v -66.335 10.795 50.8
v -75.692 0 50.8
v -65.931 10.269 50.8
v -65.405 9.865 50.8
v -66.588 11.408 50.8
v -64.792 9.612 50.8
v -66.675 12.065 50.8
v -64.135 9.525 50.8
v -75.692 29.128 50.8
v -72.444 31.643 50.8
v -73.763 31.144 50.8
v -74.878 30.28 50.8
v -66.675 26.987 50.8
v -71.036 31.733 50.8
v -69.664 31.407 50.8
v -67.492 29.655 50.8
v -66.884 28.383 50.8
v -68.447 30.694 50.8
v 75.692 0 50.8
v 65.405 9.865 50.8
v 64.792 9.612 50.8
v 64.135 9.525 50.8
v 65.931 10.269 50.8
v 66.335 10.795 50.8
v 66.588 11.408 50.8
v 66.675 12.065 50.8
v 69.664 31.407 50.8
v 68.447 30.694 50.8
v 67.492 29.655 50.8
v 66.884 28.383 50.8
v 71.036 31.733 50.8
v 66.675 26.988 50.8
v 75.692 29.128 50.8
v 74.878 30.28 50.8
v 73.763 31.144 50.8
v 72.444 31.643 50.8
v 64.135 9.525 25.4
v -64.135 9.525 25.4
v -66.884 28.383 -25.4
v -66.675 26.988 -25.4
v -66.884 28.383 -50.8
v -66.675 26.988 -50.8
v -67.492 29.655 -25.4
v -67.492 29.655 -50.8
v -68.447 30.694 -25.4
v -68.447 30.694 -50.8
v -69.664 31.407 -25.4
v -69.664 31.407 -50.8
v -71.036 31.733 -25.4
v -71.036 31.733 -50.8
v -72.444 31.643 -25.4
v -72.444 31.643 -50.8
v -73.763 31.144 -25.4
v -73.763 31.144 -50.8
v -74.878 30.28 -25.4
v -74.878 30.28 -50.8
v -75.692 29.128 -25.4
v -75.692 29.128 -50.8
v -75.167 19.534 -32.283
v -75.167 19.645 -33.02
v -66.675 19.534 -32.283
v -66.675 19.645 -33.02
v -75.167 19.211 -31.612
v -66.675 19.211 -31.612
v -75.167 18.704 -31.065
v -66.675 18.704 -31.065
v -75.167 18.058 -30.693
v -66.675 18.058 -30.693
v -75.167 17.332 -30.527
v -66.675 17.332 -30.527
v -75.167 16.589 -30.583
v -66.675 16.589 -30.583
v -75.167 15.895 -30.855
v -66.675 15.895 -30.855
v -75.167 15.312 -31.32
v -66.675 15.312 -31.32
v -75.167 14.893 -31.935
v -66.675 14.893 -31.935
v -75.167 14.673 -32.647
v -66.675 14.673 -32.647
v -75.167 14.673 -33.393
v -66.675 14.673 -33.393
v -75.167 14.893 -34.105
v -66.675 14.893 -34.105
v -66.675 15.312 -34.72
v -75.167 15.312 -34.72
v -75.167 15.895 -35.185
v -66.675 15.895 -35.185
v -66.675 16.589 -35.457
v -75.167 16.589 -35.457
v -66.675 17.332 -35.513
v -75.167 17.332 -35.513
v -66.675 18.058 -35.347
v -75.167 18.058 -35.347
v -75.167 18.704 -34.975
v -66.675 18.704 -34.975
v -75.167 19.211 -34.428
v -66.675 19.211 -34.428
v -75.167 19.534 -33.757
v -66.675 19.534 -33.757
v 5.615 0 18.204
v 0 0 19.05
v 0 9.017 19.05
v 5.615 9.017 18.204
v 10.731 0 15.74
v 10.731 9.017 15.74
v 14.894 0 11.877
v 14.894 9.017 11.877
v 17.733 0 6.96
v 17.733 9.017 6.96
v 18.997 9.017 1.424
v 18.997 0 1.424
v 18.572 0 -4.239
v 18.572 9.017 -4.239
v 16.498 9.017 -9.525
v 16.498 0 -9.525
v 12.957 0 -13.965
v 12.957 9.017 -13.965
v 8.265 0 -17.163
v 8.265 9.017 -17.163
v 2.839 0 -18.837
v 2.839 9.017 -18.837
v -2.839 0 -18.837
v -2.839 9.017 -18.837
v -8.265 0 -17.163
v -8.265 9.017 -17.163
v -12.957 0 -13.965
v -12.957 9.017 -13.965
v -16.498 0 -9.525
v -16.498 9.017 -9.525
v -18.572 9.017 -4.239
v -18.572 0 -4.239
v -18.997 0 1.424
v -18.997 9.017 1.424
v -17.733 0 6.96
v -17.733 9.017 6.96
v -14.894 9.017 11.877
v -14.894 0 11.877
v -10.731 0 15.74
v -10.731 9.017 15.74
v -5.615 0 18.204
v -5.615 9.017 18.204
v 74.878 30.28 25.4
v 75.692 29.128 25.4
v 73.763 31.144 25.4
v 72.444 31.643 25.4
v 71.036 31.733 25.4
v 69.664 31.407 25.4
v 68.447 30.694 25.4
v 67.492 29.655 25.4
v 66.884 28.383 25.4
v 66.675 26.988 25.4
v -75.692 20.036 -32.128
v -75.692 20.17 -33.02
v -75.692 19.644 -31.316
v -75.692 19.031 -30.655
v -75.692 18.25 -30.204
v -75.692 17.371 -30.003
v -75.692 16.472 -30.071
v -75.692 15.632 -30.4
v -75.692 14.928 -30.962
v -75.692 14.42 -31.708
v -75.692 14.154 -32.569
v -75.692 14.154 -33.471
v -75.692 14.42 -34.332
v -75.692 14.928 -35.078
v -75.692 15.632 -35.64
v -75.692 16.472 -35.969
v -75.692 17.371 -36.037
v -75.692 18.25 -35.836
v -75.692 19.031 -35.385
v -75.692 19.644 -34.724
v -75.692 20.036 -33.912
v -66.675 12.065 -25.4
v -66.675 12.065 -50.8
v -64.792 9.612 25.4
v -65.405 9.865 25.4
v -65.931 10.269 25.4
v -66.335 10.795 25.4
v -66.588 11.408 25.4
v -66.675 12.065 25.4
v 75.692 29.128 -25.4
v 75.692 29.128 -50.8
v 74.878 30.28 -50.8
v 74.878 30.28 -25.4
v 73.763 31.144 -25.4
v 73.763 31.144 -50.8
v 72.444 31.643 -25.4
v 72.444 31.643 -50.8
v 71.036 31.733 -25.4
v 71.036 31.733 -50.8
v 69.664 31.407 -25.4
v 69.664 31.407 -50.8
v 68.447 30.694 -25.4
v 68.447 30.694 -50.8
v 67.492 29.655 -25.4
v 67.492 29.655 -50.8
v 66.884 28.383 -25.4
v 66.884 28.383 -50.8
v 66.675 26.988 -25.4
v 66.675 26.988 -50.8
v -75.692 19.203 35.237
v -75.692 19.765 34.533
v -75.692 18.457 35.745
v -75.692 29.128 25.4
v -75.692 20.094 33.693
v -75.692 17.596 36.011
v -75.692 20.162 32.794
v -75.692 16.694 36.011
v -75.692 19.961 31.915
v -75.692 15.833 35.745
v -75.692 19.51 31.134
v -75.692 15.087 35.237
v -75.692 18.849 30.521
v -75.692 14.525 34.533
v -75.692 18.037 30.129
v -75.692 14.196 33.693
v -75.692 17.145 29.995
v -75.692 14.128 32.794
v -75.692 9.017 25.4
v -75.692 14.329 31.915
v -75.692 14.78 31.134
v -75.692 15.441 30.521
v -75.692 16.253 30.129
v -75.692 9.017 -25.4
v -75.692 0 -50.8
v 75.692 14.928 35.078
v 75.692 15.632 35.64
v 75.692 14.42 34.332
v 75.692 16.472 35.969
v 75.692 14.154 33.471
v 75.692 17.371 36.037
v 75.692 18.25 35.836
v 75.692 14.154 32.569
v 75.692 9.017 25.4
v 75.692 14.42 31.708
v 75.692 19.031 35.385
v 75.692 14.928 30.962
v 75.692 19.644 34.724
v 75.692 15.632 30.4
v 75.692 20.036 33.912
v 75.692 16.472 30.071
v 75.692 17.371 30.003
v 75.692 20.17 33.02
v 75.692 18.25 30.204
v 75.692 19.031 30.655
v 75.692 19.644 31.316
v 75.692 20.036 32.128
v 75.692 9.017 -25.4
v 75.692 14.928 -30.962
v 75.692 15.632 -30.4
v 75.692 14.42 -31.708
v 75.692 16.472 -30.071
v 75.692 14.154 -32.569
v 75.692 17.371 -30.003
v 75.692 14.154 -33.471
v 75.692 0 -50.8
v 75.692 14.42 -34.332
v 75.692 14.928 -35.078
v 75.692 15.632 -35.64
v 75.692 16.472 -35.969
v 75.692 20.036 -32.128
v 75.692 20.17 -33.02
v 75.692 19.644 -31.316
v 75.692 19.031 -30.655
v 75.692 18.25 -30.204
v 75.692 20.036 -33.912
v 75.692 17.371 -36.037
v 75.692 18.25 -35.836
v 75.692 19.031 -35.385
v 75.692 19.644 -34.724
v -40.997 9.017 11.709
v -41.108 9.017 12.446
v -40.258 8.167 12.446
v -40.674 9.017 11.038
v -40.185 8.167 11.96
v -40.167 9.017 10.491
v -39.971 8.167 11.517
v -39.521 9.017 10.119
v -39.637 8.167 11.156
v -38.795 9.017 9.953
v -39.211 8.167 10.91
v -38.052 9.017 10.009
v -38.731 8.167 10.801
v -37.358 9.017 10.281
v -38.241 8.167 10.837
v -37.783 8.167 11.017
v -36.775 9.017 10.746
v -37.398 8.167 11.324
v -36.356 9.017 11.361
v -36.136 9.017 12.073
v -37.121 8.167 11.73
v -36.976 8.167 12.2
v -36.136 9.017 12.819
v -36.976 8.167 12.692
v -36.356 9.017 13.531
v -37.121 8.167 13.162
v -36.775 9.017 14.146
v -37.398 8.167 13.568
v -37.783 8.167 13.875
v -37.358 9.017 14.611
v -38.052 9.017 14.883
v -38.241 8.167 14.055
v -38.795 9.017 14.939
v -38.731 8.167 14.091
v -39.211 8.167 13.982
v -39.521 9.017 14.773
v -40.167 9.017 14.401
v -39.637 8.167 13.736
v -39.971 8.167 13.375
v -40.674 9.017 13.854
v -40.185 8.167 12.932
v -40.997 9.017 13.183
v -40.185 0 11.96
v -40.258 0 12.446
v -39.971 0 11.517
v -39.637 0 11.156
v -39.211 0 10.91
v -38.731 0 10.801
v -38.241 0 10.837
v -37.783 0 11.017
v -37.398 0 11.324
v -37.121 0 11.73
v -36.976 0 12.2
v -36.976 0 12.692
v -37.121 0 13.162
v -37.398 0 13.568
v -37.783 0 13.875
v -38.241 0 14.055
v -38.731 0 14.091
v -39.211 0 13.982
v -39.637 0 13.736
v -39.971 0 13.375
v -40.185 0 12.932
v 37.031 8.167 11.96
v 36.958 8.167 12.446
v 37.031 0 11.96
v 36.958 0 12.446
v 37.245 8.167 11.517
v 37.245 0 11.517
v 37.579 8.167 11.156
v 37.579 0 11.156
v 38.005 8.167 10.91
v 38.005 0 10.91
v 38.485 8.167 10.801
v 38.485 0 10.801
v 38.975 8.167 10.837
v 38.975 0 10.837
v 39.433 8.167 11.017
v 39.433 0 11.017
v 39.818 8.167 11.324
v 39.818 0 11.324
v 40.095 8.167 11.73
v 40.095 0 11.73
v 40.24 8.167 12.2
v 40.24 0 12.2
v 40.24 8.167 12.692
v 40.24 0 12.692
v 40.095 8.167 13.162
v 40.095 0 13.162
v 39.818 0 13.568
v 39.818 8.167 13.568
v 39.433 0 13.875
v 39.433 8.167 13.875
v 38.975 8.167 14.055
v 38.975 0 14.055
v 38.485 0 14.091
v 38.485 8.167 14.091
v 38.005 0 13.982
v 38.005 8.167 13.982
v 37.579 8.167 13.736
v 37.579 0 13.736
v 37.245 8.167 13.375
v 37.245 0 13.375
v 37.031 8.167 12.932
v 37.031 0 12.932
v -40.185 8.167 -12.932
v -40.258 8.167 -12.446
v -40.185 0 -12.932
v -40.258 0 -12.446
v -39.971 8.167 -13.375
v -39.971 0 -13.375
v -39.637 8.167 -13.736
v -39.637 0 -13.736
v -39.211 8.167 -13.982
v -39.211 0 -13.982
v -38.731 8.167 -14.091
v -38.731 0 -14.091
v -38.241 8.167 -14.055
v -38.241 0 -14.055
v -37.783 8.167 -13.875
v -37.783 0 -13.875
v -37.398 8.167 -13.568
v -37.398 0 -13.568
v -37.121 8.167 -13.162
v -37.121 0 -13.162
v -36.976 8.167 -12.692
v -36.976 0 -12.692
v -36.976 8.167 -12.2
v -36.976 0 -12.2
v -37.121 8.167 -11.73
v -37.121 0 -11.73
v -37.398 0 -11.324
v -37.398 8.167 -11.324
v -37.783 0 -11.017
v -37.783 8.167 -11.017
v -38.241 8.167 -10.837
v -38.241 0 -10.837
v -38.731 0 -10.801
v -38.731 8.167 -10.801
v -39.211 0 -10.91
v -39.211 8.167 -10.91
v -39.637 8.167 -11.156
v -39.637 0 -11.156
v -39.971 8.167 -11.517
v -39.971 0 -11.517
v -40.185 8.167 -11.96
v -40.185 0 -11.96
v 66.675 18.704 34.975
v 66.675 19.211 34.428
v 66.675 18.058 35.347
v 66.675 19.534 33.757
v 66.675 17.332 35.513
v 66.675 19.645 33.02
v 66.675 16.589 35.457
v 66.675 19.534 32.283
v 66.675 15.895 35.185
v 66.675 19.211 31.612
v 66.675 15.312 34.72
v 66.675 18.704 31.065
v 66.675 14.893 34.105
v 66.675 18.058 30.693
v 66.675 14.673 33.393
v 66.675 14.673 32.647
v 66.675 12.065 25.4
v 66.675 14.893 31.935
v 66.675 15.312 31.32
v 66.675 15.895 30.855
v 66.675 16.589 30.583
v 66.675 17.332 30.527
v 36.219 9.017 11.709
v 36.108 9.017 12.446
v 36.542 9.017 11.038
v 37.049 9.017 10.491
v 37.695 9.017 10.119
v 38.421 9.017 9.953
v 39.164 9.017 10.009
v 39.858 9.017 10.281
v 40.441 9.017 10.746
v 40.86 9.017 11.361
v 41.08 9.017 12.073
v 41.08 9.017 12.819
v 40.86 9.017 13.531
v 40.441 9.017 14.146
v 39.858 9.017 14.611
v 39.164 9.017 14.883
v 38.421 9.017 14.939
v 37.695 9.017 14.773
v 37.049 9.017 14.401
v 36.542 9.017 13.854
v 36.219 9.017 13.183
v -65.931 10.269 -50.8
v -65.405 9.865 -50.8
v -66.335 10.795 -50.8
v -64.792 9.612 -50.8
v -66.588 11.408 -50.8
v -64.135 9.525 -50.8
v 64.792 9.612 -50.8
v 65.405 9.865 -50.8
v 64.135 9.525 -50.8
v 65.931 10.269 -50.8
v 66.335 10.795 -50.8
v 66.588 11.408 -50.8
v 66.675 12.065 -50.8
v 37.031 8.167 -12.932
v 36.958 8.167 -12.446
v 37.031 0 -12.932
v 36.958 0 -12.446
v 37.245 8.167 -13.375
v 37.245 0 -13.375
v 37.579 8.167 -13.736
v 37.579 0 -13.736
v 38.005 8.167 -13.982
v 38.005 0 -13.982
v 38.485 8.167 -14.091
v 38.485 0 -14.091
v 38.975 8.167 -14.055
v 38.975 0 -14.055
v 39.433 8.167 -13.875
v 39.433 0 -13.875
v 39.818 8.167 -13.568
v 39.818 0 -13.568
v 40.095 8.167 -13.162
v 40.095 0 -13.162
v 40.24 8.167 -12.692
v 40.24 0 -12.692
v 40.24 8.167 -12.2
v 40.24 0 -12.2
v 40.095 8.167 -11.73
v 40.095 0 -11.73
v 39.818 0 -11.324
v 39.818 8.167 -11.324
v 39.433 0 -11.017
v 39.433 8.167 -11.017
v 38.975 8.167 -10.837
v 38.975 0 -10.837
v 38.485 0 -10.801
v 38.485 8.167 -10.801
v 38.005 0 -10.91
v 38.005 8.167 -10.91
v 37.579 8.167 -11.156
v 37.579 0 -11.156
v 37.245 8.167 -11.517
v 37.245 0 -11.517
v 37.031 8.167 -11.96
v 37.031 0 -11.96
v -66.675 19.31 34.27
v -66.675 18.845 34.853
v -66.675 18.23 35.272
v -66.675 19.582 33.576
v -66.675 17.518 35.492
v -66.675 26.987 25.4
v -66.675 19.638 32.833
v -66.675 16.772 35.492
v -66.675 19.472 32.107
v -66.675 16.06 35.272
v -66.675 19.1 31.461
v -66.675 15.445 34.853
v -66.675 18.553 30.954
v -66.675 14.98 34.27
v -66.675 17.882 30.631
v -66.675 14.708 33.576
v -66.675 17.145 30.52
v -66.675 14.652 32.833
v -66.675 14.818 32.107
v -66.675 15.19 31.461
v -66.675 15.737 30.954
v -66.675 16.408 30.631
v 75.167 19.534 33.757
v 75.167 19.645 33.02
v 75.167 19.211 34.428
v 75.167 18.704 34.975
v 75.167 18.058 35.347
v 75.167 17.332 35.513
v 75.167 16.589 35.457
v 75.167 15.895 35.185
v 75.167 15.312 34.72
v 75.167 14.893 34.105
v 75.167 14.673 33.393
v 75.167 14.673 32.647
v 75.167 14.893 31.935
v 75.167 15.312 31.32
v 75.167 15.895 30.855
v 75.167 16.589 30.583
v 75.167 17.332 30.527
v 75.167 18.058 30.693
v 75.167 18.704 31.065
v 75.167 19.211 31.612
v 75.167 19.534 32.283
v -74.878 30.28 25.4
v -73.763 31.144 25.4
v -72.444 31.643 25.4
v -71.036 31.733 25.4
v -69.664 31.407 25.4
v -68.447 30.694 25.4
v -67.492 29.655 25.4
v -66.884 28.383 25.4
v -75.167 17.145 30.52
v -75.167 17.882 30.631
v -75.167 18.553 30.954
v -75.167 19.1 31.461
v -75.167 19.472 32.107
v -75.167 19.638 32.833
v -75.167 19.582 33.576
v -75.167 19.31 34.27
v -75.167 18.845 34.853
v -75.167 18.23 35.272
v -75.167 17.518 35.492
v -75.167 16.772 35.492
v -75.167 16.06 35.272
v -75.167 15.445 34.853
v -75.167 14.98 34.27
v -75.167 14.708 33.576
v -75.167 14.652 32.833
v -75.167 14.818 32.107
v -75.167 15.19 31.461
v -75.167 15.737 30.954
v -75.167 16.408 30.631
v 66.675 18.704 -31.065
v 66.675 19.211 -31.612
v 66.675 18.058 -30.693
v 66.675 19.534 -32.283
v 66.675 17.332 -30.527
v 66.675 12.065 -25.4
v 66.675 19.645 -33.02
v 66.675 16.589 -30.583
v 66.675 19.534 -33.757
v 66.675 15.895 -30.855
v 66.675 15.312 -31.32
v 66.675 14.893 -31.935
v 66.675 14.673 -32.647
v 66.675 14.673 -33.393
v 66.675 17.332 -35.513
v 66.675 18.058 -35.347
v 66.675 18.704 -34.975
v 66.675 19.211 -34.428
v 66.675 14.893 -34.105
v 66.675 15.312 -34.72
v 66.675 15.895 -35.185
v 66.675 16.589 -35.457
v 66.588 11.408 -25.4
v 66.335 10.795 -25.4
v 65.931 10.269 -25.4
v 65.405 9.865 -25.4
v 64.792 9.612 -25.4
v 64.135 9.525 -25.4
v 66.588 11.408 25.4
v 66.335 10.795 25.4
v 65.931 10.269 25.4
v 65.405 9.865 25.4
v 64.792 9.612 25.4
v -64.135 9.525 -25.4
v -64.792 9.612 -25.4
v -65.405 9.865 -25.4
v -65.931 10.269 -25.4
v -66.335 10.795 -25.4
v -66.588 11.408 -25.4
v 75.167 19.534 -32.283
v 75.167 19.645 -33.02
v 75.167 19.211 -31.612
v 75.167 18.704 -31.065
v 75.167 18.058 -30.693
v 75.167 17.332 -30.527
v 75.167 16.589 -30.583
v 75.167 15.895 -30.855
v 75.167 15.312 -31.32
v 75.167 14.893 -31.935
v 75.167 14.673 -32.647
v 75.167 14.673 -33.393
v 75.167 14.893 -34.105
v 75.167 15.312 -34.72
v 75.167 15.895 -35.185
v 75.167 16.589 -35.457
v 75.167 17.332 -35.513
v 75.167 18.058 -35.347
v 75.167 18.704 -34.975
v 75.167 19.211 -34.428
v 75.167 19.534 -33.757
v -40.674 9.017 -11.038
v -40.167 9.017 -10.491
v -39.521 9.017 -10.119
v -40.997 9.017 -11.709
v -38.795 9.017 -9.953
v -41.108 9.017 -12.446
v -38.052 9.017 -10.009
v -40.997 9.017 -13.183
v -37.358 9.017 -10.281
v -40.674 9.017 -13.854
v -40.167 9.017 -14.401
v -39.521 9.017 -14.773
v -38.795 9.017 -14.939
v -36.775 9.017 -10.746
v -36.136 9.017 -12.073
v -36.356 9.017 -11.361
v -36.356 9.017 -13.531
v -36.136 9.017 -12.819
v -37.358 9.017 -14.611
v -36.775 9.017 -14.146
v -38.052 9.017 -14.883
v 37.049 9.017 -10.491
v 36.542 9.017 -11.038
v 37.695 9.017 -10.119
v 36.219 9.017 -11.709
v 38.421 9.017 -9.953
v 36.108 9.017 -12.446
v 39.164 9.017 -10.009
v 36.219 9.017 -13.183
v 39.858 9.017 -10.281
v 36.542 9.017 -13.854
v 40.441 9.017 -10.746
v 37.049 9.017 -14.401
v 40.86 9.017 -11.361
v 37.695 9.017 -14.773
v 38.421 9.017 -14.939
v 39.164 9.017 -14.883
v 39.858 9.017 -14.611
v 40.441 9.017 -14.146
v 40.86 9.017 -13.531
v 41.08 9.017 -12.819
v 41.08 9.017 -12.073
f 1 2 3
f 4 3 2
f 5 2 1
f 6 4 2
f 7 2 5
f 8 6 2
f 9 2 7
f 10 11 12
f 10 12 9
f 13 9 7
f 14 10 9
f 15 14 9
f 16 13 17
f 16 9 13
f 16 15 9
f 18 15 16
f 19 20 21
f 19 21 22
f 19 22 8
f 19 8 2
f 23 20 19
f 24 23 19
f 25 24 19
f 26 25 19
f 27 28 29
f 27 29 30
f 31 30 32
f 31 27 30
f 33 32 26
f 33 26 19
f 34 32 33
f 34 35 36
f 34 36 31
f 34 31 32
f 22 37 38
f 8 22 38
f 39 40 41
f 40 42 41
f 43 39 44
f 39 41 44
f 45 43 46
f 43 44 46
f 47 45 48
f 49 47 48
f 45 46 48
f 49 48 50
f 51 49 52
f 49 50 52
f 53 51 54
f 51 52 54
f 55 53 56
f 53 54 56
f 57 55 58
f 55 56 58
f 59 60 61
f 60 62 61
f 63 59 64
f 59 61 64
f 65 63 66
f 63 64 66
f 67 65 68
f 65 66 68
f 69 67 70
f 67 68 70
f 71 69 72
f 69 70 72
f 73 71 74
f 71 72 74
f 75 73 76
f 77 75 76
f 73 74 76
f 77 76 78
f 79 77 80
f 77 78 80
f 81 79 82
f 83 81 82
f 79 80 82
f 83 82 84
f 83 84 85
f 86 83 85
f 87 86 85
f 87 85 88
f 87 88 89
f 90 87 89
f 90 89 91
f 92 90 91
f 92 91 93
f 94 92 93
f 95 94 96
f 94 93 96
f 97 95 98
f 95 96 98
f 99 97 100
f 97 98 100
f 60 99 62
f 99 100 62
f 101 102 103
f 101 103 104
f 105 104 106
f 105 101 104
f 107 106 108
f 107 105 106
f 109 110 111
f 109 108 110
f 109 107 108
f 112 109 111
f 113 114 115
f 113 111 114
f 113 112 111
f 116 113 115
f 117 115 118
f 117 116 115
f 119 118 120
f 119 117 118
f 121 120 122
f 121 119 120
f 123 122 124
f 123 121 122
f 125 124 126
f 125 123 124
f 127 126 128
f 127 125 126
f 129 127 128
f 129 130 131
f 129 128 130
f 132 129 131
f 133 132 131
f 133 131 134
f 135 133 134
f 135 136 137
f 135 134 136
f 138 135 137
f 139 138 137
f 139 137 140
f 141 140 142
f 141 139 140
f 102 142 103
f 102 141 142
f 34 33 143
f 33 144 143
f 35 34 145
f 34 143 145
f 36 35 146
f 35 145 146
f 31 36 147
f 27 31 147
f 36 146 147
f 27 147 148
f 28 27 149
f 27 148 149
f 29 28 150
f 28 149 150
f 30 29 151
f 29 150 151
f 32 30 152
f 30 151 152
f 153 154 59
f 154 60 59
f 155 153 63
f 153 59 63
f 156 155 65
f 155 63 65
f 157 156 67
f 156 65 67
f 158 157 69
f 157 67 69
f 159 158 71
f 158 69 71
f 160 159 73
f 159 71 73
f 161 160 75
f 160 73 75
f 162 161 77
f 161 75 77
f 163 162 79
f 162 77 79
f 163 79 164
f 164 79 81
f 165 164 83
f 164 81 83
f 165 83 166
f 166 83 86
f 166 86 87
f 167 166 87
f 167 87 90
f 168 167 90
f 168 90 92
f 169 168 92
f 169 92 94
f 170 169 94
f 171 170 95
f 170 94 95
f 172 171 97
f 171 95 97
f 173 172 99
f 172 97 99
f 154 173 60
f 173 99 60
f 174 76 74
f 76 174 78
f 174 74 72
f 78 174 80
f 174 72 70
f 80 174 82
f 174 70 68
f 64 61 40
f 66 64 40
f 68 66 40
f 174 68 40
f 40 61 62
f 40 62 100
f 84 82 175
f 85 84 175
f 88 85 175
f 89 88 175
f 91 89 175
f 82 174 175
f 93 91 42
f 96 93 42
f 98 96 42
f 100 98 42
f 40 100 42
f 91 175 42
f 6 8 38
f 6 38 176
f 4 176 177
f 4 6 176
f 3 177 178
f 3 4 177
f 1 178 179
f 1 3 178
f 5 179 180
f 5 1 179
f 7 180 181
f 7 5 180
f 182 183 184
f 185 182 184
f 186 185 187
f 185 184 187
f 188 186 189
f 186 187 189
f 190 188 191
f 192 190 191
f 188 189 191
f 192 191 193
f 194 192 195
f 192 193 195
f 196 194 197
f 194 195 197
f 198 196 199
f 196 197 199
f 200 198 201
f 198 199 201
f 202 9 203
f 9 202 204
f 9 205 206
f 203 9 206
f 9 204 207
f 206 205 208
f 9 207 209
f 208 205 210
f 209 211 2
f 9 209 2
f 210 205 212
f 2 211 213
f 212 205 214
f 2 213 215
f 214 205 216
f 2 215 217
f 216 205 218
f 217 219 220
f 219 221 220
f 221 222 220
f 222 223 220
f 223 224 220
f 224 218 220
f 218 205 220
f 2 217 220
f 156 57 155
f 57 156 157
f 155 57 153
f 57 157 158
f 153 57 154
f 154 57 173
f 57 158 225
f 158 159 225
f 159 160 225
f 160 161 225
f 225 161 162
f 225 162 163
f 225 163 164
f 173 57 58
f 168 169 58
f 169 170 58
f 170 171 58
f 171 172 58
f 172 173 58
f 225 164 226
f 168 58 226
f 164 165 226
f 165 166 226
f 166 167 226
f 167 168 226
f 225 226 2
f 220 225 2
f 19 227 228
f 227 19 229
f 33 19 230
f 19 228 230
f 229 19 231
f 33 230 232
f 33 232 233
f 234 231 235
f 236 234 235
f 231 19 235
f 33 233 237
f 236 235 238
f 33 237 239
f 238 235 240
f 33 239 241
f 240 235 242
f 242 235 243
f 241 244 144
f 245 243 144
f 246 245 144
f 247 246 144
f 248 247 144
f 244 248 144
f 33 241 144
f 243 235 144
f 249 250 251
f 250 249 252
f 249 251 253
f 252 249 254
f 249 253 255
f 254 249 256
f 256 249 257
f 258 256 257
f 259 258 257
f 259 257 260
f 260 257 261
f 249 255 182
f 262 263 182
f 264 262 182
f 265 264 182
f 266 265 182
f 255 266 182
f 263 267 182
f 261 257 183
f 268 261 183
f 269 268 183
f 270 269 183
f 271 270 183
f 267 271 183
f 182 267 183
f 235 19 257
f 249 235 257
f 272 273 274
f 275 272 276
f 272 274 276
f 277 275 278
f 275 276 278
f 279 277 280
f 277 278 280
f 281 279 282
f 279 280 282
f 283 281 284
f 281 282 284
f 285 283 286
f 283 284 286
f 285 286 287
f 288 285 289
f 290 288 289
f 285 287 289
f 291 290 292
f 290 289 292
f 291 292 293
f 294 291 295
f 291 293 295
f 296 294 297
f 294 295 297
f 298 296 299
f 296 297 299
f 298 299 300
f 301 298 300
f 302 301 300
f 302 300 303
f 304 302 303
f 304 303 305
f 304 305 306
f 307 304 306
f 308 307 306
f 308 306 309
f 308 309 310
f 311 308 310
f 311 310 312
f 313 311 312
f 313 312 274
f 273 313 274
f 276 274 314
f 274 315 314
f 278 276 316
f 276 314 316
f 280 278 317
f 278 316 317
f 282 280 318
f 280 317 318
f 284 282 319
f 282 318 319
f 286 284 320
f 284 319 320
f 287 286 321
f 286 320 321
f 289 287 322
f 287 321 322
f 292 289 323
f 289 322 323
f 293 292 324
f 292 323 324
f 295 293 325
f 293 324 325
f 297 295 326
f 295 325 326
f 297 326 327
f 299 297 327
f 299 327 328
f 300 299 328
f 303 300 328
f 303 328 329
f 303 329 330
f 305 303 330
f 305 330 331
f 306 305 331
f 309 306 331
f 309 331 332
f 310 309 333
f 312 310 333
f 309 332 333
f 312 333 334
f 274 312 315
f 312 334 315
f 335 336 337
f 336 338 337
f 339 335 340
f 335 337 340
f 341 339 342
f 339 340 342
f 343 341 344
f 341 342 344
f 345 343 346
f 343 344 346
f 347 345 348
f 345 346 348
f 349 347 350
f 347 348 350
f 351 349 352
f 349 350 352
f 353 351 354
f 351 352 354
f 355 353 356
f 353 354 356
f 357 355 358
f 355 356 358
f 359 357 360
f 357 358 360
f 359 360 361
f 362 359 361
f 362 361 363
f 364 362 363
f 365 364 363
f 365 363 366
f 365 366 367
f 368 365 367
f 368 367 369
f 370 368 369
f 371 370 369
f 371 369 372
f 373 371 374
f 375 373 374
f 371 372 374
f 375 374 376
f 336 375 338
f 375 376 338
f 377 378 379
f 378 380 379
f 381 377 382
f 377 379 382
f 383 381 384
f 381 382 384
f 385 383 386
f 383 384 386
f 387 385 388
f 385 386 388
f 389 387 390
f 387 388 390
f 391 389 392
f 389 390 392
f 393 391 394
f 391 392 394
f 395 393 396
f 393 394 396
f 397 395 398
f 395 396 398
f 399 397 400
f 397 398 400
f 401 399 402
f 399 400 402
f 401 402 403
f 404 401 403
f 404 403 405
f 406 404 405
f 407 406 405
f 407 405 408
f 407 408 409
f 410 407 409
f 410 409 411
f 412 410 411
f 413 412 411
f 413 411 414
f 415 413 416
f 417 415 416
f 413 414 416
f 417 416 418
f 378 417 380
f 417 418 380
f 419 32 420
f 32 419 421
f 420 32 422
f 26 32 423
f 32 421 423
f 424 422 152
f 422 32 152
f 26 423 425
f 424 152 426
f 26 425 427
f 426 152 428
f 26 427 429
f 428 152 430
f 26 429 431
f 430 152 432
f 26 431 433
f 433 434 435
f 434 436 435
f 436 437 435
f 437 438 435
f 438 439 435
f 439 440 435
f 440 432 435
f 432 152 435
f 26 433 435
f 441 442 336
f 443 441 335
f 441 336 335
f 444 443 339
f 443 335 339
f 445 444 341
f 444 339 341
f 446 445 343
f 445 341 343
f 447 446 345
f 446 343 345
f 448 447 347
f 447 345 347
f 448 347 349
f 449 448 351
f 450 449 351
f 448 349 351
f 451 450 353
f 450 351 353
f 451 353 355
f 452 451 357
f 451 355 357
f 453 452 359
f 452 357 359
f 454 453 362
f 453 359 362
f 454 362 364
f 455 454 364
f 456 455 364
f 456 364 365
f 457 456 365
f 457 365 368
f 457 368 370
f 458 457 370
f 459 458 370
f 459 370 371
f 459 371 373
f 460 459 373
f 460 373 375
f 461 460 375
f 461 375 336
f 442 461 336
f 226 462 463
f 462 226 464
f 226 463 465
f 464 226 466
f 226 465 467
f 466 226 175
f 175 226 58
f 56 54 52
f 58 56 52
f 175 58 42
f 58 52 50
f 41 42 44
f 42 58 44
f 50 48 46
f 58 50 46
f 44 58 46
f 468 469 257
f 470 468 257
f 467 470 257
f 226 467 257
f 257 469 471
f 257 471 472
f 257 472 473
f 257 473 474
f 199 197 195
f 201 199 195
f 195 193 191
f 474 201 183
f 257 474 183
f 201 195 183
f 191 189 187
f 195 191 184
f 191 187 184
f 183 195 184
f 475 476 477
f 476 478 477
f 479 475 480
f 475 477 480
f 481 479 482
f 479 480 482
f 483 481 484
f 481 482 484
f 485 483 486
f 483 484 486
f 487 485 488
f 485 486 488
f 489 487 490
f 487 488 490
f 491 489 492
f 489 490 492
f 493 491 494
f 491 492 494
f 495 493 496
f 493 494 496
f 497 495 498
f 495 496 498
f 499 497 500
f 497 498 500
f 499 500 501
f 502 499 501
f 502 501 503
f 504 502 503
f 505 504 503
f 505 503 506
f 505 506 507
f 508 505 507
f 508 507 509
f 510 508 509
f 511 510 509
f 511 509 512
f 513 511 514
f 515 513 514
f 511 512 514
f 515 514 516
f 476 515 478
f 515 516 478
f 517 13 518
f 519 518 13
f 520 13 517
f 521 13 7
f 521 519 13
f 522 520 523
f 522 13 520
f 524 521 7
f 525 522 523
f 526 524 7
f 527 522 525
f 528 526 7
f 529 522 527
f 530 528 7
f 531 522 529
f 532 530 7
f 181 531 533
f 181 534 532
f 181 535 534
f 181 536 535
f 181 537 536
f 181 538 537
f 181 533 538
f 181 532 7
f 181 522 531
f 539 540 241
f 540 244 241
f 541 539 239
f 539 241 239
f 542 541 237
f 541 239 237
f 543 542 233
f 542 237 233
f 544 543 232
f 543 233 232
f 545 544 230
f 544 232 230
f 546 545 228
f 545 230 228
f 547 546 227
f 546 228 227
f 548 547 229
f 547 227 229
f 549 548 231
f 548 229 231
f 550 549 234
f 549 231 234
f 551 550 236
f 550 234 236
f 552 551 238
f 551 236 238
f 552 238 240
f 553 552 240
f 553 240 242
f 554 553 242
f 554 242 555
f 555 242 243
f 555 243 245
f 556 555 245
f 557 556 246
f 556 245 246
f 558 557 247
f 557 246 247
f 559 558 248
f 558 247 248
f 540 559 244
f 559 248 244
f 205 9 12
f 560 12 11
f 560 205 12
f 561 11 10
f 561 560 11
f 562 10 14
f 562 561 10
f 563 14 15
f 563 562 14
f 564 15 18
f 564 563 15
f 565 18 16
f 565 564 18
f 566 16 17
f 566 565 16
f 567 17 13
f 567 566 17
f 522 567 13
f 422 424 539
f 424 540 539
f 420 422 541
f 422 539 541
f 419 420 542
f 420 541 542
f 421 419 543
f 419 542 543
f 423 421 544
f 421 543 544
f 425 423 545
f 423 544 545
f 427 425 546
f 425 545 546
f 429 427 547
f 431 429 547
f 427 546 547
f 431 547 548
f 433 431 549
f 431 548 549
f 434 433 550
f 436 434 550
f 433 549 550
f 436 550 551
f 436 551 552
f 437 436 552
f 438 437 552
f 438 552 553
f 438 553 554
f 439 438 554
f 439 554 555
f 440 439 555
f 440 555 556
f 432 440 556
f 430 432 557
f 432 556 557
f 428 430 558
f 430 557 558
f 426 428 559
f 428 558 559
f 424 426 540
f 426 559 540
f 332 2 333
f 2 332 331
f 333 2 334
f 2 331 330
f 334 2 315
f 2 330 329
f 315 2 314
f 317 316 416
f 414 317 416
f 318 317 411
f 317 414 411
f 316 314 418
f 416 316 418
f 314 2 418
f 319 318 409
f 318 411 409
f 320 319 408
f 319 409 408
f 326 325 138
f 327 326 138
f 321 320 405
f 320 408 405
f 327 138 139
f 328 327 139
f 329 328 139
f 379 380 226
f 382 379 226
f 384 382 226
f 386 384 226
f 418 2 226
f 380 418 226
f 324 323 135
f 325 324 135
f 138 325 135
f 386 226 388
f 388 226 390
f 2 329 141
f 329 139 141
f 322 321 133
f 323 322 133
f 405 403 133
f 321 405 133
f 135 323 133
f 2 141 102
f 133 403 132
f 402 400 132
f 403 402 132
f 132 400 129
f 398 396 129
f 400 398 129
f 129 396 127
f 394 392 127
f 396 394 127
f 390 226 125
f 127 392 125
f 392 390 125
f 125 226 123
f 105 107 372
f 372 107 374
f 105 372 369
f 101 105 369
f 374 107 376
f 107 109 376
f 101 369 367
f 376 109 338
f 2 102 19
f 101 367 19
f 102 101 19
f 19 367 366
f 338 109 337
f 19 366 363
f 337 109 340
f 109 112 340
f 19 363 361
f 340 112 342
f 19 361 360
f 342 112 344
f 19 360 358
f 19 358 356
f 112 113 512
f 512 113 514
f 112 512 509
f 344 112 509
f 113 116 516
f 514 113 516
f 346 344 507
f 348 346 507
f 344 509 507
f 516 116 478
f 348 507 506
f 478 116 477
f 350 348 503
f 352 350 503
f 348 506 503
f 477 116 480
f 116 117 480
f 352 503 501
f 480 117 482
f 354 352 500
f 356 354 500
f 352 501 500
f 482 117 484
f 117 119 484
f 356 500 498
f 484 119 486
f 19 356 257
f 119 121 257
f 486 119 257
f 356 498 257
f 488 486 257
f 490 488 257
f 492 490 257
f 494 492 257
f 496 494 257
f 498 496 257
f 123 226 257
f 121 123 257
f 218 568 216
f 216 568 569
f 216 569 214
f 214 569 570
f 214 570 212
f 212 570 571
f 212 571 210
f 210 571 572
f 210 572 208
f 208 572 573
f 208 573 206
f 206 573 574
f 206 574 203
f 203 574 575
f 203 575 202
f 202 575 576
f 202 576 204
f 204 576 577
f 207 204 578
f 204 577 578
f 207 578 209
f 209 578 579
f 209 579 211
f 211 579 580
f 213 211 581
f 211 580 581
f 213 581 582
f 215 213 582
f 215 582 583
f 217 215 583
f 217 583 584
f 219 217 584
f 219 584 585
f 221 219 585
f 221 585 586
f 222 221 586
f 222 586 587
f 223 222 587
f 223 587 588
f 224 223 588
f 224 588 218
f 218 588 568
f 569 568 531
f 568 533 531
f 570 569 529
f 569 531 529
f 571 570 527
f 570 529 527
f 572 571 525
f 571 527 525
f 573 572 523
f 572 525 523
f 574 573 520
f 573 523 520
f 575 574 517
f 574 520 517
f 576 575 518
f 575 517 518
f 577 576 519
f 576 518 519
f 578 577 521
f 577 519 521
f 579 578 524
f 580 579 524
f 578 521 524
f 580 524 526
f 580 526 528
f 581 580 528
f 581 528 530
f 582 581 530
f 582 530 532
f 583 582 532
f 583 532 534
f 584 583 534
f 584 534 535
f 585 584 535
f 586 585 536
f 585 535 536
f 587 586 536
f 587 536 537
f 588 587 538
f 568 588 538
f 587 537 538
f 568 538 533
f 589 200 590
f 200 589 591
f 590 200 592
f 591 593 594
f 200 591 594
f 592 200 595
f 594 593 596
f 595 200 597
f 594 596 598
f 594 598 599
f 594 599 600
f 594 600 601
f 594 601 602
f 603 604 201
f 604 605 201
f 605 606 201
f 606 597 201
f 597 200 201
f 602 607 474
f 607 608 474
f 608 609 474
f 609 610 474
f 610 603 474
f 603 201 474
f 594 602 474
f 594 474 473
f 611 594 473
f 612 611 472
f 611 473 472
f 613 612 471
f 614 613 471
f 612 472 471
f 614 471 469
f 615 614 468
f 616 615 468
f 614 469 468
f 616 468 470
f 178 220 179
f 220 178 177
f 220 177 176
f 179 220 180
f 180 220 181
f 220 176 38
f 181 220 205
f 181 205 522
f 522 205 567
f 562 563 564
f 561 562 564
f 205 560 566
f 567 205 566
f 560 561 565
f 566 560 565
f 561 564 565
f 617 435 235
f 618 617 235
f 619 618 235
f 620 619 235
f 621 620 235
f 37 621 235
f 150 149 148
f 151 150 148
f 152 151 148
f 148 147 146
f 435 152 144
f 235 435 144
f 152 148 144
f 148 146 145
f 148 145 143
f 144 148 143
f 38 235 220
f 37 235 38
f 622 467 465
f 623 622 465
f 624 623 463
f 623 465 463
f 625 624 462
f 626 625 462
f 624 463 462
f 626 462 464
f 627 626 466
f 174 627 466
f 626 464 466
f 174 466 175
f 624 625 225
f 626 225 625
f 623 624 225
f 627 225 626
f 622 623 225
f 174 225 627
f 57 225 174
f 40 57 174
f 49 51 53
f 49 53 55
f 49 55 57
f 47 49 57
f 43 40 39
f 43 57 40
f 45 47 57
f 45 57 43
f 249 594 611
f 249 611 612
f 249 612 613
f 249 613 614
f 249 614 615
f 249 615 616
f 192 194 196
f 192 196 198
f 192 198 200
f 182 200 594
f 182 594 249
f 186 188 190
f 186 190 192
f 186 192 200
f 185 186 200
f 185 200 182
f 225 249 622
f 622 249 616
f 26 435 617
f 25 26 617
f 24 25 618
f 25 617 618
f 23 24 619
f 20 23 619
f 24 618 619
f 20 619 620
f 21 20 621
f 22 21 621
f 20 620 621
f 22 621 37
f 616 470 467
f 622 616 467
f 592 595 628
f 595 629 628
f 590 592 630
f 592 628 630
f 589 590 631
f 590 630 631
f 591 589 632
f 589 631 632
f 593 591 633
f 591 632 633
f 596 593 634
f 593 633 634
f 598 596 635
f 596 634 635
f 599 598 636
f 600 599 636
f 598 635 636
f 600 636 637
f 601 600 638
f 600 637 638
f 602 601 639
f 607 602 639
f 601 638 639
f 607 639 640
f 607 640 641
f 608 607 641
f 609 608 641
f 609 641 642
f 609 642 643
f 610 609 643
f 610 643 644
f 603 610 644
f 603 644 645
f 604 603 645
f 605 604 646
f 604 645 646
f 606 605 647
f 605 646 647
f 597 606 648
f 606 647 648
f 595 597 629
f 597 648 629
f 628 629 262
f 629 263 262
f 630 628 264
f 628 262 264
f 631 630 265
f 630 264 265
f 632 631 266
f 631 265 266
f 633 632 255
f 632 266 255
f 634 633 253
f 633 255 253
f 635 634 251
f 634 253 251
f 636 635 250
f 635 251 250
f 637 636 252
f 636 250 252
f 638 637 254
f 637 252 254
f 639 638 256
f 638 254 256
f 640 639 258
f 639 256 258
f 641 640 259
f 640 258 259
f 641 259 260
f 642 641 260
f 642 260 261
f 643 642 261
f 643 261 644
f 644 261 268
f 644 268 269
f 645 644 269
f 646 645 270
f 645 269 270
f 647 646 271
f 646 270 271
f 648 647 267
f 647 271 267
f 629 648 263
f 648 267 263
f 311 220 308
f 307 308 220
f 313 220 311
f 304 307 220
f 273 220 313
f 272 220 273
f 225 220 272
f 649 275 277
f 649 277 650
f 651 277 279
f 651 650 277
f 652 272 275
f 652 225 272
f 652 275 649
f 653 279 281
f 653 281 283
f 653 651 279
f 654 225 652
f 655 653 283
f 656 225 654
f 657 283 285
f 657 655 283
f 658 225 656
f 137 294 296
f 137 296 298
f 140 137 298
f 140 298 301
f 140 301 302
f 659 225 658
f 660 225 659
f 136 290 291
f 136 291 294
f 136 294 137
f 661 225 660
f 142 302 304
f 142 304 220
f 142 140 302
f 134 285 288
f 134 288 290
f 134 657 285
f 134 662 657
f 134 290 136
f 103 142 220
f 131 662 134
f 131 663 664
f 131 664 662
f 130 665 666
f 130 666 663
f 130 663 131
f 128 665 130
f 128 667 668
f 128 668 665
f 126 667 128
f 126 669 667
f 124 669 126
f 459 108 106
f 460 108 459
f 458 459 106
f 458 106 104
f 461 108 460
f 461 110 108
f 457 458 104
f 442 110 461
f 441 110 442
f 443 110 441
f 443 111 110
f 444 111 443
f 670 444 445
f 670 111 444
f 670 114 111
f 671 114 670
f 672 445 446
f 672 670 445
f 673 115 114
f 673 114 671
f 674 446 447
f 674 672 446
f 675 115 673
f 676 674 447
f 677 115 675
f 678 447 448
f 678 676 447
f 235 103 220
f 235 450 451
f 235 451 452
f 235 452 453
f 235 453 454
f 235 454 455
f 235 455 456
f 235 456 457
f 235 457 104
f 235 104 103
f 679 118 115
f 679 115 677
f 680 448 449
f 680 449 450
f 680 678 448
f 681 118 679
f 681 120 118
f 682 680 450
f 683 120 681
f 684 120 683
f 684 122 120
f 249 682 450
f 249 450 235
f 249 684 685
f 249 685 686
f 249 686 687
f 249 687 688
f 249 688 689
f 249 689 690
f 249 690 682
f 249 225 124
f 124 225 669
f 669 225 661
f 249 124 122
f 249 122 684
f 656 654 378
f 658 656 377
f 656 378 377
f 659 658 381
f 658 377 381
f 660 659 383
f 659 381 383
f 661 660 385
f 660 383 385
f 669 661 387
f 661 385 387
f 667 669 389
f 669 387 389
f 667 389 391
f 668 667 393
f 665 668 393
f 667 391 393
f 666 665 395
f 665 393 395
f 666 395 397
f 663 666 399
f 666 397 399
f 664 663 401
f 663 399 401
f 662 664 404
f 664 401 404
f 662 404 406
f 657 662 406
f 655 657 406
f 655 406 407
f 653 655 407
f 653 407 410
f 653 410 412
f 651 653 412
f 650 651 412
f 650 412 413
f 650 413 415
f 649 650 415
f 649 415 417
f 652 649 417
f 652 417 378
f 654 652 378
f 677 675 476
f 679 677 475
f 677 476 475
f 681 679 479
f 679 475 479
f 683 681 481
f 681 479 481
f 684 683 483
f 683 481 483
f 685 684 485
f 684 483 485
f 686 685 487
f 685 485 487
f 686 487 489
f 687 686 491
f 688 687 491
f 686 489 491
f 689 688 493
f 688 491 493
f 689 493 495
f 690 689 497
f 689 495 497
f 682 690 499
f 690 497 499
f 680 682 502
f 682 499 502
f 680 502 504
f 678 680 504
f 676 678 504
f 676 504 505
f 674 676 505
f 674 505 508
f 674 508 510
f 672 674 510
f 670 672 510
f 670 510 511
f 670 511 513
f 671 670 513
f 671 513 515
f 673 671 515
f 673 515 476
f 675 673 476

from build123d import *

# Parameters (mm, degrees)
EXTRUDE_THIN1_DEPTH             = 50.8
FILLET1_RADIUS                  = 4.7625
FILLET1_LENGTH                  = 50.8
FILLET2_R                       = 2.54
CUT_EXTRUDE1_DEPTH              = 97.928543268
CUT_EXTRUDE1_DEPTH_BACK         = 97.928543268
SKETCH5_W                       = 25.4
SKETCH5_H                       = 22.733
CUT_EXTRUDE3_START              = -76.2
SKETCH8_W                       = 50.8
SKETCH8_H                       = 31.75
CUT_EXTRUDE3_DEPTH              = 0.508
M6X1_0_TAPPED_HOLE1_D           = 5
M6X1_0_TAPPED_HOLE1_CSINK_D     = 6.05
M6X1_0_TAPPED_HOLE1_CSINK_ANGLE = 90
MIRROR1_START                   = -50.8
MIRROR1_OUTLINE_W               = 151.384
MIRROR1_OUTLINE_H               = 9.017
MIRROR1_DEPTH                   = 101.6
MIRROR1_2_DEPTH                 = 15.2799999
MIRROR1_START_2                 = 35.5200001
MIRROR1_3_DEPTH                 = 15.2799999
MIRROR1_START_3                 = -30.5199999
MIRROR1_4_DEPTH                 = 5.1199999
MIRROR1_START_4                 = 25.4
MIRROR1_5_DEPTH                 = 5.1199999
MIRROR1_START_5                 = -35.5200001
MIRROR1_6_DEPTH                 = 5.0000002
MIRROR1_START_6                 = 30.5199999
MIRROR1_7_DEPTH                 = 5.0000002
CUT_EXTRUDE2_DEPTH              = 97.529691619
CUT_EXTRUDE2_DEPTH_BACK         = 97.529691619
SKETCH7_R                       = 19.05
M4X0_7_TAPPED_HOLE3_D           = 3.3
M4X0_7_TAPPED_HOLE3_CSINK_D     = 5
M4X0_7_TAPPED_HOLE3_CSINK_ANGLE = 90


with BuildPart() as part:
    # Sketch4 → Extrude-Thin1 (new body)
    with BuildSketch(Plane.XY):
        Polygon((0, 0), (-76.2, 0), (-76.2, 31.75), (-66.675, 31.75), (-66.675, 9.525), (0, 9.525), align=None)
    extrude(amount=EXTRUDE_THIN1_DEPTH)

    # Fillet1: full round fillet: the end face becomes a half cylinder, R = half its width
    fillet1_face = Plane((-71.4375, 31.75, 25.4), x_dir=(0, 0, -1), z_dir=(0, 1, 0))  # on the end face: x along it, z out of the body
    fillet1_slab = fillet1_face.offset(-FILLET1_RADIUS / 2) * Box(FILLET1_LENGTH, 2 * FILLET1_RADIUS, FILLET1_RADIUS, mode=Mode.PRIVATE)  # the body's end, R deep
    fillet1_round = Plane((-71.4375, 26.9875, 25.4), x_dir=(0, 1, 0), z_dir=(0, 0, -1)) * Cylinder(FILLET1_RADIUS, FILLET1_LENGTH, mode=Mode.PRIVATE)  # its axis R under the face
    add(fillet1_slab - fillet1_round, mode=Mode.SUBTRACT)

    # Fillet2
    fillet2_edges = [part.edges().sort_by_distance(p)[0] for p in [
        (-66.675, 9.525, 25.4),
    ]]
    fillet(fillet2_edges, radius=FILLET2_R)

    # Sketch5 → Cut-Extrude1 (cut, two sides: drawn at the far end of the back side and taken through both)
    with BuildSketch(Plane(origin=(0, 0, 0), x_dir=(0, 0, -1), z_dir=(1, 0, 0)).offset(-CUT_EXTRUDE1_DEPTH_BACK)):
        with Locations((-12.7, 20.3835)):
            Rectangle(SKETCH5_W, SKETCH5_H)
    extrude(amount=CUT_EXTRUDE1_DEPTH + CUT_EXTRUDE1_DEPTH_BACK, mode=Mode.SUBTRACT)

    # Sketch8 → Cut-Extrude3 (cut)
    with BuildSketch(Plane(origin=(0, 0, 0), x_dir=(0, 0, -1), z_dir=(1, 0, 0)).offset(CUT_EXTRUDE3_START)):
        with Locations((-25.4, 15.875)):
            Rectangle(SKETCH8_W, SKETCH8_H)
    extrude(amount=CUT_EXTRUDE3_DEPTH, mode=Mode.SUBTRACT)

    # M6x1.0 Tapped Hole1 (through all)
    with Locations(Plane.ZY.offset(75.692)):
        with Locations((33.02, 17.145)):
            CounterSinkHole(M6X1_0_TAPPED_HOLE1_D / 2, M6X1_0_TAPPED_HOLE1_CSINK_D / 2, counter_sink_angle=M6X1_0_TAPPED_HOLE1_CSINK_ANGLE)

    # Mirror1: read off the stored shape, not the designer's step
    # Mirror1 outline → Mirror1 (add)
    with BuildSketch(Plane.XY.offset(MIRROR1_START)):
        with Locations((0, 4.5085)):
            Rectangle(MIRROR1_OUTLINE_W, MIRROR1_OUTLINE_H)
    extrude(amount=MIRROR1_DEPTH)

    # Mirror1 2 outline → Mirror1 2 (add)
    with BuildSketch(Plane.XY.offset(MIRROR1_START)):
        with BuildLine():
            Line((-66.675, 12.065), (-66.675, 26.9875))
            ThreePointArc((-66.675, 26.9875), (-70.337647737, 31.621259947), (-75.692, 29.127742042))
            Line((-75.692, 29.127742042), (-75.692, 9.017))
            Line((-75.692, 9.017), (75.692, 9.017))
            Line((75.692, 9.017), (75.692, 29.127742042))
            ThreePointArc((75.692, 29.127742042), (70.337647737, 31.621259947), (66.675, 26.9875))
            Line((66.675, 26.9875), (66.675, 12.065))
            ThreePointArc((66.675, 12.065), (65.931051224, 10.268948776), (64.135, 9.525))
            Line((64.135, 9.525), (-64.135, 9.525))
            ThreePointArc((-64.135, 9.525), (-65.931051224, 10.268948776), (-66.675, 12.065))
        make_face()
    extrude(amount=MIRROR1_2_DEPTH)

    # Mirror1 3 outline → Mirror1 3 (add)
    with BuildSketch(Plane.XY.offset(MIRROR1_START_2)):
        with BuildLine():
            Line((0, 9.525), (0, 9.017))
            Line((0, 9.017), (75.692, 9.017))
            Line((75.692, 9.017), (75.692, 29.127742042))
            ThreePointArc((75.692, 29.127742042), (70.337647737, 31.621259947), (66.675, 26.9875))
            Line((66.675, 26.9875), (66.675, 12.065))
            ThreePointArc((66.675, 12.065), (65.931051224, 10.268948776), (64.135, 9.525))
            Line((64.135, 9.525), (0, 9.525))
        make_face()
    extrude(amount=MIRROR1_3_DEPTH)

    # Mirror1 4 outline → Mirror1 4 (add)
    with BuildSketch(Plane.XY.offset(MIRROR1_START_3)):
        with BuildLine():
            Line((-66.675, 12.065), (-66.675, 26.9875))
            ThreePointArc((-66.675, 26.9875), (-70.337647737, 31.621259947), (-75.692, 29.127742042))
            Line((-75.692, 29.127742042), (-75.692, 9.017))
            Line((-75.692, 9.017), (75.692, 9.017))
            Line((75.692, 9.017), (75.692, 29.127742042))
            ThreePointArc((75.692, 29.127742042), (70.337647737, 31.621259947), (66.675, 26.9875))
            Line((66.675, 26.9875), (66.675, 12.065))
            ThreePointArc((66.675, 12.065), (65.931051224, 10.268948776), (64.135, 9.525))
            Line((64.135, 9.525), (-64.135, 9.525))
            ThreePointArc((-64.135, 9.525), (-65.931051224, 10.268948776), (-66.675, 12.065))
        make_face()
    extrude(amount=MIRROR1_4_DEPTH)

    # Mirror1 5 outline → Mirror1 5 (add)
    with BuildSketch(Plane.XY.offset(MIRROR1_START_4)):
        with BuildLine():
            Line((0, 9.525), (0, 9.017))
            Line((0, 9.017), (75.692, 9.017))
            Line((75.692, 9.017), (75.692, 29.127742042))
            ThreePointArc((75.692, 29.127742042), (70.337647737, 31.621259947), (66.675, 26.9875))
            Line((66.675, 26.9875), (66.675, 12.065))
            ThreePointArc((66.675, 12.065), (65.931051224, 10.268948776), (64.135, 9.525))
            Line((64.135, 9.525), (0, 9.525))
        make_face()
    extrude(amount=MIRROR1_5_DEPTH)

    # Mirror1 6 outline → Mirror1 6 (add)
    with BuildSketch(Plane.XY.offset(MIRROR1_START_5)):
        with BuildLine():
            Line((-66.675, 12.065), (-66.675, 26.9875))
            ThreePointArc((-66.675, 26.9875), (-70.337647737, 31.621259947), (-75.692, 29.127742042))
            Line((-75.692, 29.127742042), (-75.692, 9.017))
            Line((-75.692, 9.017), (75.692, 9.017))
            Line((75.692, 9.017), (75.692, 29.127742042))
            ThreePointArc((75.692, 29.127742042), (70.337647737, 31.621259947), (66.675, 26.9875))
            Line((66.675, 26.9875), (66.675, 12.065))
            ThreePointArc((66.675, 12.065), (65.931051224, 10.268948776), (64.135, 9.525))
            Line((64.135, 9.525), (-64.135, 9.525))
            ThreePointArc((-64.135, 9.525), (-65.931051224, 10.268948776), (-66.675, 12.065))
        make_face()
    extrude(amount=MIRROR1_6_DEPTH)

    # Mirror1 7 outline → Mirror1 7 (add)
    with BuildSketch(Plane.XY.offset(MIRROR1_START_6)):
        with BuildLine():
            Line((0, 9.525), (0, 9.017))
            Line((0, 9.017), (75.692, 9.017))
            Line((75.692, 9.017), (75.692, 29.127742042))
            ThreePointArc((75.692, 29.127742042), (70.337647737, 31.621259947), (66.675, 26.9875))
            Line((66.675, 26.9875), (66.675, 12.065))
            ThreePointArc((66.675, 12.065), (65.931051224, 10.268948776), (64.135, 9.525))
            Line((64.135, 9.525), (0, 9.525))
        make_face()
    extrude(amount=MIRROR1_7_DEPTH)

    # Mirror1 8 outline → Mirror1 8 (revolve, cut)
    with BuildSketch(Plane(origin=(0, 17.145, 33.02), x_dir=(0, 1, 0), z_dir=(0, 0, -1))):
        Polygon((0, 66.675), (2.5, 66.675), (2.5, 75.167), (3.025, 75.692), (0, 75.692), align=None)
    revolve(axis=Axis((0, 17.145, 33.02), (1, 0, 0)), mode=Mode.SUBTRACT)

    # Mirror1 9 outline → Mirror1 9 (revolve, cut)
    with BuildSketch(Plane(origin=(0, 17.145, -33.02), x_dir=(0, 1, 0), z_dir=(0, 0, -1))):
        Polygon((2.5, -75.167), (2.5, -66.675), (0, -66.675), (0, -75.692), (3.025, -75.692), align=None)
        Polygon((0, 66.675), (2.5, 66.675), (2.5, 75.167), (3.025, 75.692), (0, 75.692), align=None)
    revolve(axis=Axis((0, 17.145, -33.02), (1, 0, 0)), mode=Mode.SUBTRACT)

    # Sketch7 → Cut-Extrude2 (cut, two sides: drawn at the far end of the back side and taken through both)
    with BuildSketch(Plane(origin=(0, 0, 0), x_dir=(1, 0, 0), z_dir=(0, 1, 0)).offset(-CUT_EXTRUDE2_DEPTH_BACK)):
        with Locations(Location((0, 0, 0), (0, 0, 270))):
            Circle(SKETCH7_R)
    extrude(amount=CUT_EXTRUDE2_DEPTH + CUT_EXTRUDE2_DEPTH_BACK, mode=Mode.SUBTRACT)

    # M4x0.7 Tapped Hole3 (through all)
    with Locations(Plane(origin=(0, 9.017, 0), x_dir=(1, 0, 0), z_dir=(0, 1, 0))):
        with Locations((38.608, -12.446), (-38.608, -12.446), (-38.608, 12.446), (38.608, 12.446)):
            CounterSinkHole(M4X0_7_TAPPED_HOLE3_D / 2, M4X0_7_TAPPED_HOLE3_CSINK_D / 2, counter_sink_angle=M4X0_7_TAPPED_HOLE3_CSINK_ANGLE)


solid = part.part
